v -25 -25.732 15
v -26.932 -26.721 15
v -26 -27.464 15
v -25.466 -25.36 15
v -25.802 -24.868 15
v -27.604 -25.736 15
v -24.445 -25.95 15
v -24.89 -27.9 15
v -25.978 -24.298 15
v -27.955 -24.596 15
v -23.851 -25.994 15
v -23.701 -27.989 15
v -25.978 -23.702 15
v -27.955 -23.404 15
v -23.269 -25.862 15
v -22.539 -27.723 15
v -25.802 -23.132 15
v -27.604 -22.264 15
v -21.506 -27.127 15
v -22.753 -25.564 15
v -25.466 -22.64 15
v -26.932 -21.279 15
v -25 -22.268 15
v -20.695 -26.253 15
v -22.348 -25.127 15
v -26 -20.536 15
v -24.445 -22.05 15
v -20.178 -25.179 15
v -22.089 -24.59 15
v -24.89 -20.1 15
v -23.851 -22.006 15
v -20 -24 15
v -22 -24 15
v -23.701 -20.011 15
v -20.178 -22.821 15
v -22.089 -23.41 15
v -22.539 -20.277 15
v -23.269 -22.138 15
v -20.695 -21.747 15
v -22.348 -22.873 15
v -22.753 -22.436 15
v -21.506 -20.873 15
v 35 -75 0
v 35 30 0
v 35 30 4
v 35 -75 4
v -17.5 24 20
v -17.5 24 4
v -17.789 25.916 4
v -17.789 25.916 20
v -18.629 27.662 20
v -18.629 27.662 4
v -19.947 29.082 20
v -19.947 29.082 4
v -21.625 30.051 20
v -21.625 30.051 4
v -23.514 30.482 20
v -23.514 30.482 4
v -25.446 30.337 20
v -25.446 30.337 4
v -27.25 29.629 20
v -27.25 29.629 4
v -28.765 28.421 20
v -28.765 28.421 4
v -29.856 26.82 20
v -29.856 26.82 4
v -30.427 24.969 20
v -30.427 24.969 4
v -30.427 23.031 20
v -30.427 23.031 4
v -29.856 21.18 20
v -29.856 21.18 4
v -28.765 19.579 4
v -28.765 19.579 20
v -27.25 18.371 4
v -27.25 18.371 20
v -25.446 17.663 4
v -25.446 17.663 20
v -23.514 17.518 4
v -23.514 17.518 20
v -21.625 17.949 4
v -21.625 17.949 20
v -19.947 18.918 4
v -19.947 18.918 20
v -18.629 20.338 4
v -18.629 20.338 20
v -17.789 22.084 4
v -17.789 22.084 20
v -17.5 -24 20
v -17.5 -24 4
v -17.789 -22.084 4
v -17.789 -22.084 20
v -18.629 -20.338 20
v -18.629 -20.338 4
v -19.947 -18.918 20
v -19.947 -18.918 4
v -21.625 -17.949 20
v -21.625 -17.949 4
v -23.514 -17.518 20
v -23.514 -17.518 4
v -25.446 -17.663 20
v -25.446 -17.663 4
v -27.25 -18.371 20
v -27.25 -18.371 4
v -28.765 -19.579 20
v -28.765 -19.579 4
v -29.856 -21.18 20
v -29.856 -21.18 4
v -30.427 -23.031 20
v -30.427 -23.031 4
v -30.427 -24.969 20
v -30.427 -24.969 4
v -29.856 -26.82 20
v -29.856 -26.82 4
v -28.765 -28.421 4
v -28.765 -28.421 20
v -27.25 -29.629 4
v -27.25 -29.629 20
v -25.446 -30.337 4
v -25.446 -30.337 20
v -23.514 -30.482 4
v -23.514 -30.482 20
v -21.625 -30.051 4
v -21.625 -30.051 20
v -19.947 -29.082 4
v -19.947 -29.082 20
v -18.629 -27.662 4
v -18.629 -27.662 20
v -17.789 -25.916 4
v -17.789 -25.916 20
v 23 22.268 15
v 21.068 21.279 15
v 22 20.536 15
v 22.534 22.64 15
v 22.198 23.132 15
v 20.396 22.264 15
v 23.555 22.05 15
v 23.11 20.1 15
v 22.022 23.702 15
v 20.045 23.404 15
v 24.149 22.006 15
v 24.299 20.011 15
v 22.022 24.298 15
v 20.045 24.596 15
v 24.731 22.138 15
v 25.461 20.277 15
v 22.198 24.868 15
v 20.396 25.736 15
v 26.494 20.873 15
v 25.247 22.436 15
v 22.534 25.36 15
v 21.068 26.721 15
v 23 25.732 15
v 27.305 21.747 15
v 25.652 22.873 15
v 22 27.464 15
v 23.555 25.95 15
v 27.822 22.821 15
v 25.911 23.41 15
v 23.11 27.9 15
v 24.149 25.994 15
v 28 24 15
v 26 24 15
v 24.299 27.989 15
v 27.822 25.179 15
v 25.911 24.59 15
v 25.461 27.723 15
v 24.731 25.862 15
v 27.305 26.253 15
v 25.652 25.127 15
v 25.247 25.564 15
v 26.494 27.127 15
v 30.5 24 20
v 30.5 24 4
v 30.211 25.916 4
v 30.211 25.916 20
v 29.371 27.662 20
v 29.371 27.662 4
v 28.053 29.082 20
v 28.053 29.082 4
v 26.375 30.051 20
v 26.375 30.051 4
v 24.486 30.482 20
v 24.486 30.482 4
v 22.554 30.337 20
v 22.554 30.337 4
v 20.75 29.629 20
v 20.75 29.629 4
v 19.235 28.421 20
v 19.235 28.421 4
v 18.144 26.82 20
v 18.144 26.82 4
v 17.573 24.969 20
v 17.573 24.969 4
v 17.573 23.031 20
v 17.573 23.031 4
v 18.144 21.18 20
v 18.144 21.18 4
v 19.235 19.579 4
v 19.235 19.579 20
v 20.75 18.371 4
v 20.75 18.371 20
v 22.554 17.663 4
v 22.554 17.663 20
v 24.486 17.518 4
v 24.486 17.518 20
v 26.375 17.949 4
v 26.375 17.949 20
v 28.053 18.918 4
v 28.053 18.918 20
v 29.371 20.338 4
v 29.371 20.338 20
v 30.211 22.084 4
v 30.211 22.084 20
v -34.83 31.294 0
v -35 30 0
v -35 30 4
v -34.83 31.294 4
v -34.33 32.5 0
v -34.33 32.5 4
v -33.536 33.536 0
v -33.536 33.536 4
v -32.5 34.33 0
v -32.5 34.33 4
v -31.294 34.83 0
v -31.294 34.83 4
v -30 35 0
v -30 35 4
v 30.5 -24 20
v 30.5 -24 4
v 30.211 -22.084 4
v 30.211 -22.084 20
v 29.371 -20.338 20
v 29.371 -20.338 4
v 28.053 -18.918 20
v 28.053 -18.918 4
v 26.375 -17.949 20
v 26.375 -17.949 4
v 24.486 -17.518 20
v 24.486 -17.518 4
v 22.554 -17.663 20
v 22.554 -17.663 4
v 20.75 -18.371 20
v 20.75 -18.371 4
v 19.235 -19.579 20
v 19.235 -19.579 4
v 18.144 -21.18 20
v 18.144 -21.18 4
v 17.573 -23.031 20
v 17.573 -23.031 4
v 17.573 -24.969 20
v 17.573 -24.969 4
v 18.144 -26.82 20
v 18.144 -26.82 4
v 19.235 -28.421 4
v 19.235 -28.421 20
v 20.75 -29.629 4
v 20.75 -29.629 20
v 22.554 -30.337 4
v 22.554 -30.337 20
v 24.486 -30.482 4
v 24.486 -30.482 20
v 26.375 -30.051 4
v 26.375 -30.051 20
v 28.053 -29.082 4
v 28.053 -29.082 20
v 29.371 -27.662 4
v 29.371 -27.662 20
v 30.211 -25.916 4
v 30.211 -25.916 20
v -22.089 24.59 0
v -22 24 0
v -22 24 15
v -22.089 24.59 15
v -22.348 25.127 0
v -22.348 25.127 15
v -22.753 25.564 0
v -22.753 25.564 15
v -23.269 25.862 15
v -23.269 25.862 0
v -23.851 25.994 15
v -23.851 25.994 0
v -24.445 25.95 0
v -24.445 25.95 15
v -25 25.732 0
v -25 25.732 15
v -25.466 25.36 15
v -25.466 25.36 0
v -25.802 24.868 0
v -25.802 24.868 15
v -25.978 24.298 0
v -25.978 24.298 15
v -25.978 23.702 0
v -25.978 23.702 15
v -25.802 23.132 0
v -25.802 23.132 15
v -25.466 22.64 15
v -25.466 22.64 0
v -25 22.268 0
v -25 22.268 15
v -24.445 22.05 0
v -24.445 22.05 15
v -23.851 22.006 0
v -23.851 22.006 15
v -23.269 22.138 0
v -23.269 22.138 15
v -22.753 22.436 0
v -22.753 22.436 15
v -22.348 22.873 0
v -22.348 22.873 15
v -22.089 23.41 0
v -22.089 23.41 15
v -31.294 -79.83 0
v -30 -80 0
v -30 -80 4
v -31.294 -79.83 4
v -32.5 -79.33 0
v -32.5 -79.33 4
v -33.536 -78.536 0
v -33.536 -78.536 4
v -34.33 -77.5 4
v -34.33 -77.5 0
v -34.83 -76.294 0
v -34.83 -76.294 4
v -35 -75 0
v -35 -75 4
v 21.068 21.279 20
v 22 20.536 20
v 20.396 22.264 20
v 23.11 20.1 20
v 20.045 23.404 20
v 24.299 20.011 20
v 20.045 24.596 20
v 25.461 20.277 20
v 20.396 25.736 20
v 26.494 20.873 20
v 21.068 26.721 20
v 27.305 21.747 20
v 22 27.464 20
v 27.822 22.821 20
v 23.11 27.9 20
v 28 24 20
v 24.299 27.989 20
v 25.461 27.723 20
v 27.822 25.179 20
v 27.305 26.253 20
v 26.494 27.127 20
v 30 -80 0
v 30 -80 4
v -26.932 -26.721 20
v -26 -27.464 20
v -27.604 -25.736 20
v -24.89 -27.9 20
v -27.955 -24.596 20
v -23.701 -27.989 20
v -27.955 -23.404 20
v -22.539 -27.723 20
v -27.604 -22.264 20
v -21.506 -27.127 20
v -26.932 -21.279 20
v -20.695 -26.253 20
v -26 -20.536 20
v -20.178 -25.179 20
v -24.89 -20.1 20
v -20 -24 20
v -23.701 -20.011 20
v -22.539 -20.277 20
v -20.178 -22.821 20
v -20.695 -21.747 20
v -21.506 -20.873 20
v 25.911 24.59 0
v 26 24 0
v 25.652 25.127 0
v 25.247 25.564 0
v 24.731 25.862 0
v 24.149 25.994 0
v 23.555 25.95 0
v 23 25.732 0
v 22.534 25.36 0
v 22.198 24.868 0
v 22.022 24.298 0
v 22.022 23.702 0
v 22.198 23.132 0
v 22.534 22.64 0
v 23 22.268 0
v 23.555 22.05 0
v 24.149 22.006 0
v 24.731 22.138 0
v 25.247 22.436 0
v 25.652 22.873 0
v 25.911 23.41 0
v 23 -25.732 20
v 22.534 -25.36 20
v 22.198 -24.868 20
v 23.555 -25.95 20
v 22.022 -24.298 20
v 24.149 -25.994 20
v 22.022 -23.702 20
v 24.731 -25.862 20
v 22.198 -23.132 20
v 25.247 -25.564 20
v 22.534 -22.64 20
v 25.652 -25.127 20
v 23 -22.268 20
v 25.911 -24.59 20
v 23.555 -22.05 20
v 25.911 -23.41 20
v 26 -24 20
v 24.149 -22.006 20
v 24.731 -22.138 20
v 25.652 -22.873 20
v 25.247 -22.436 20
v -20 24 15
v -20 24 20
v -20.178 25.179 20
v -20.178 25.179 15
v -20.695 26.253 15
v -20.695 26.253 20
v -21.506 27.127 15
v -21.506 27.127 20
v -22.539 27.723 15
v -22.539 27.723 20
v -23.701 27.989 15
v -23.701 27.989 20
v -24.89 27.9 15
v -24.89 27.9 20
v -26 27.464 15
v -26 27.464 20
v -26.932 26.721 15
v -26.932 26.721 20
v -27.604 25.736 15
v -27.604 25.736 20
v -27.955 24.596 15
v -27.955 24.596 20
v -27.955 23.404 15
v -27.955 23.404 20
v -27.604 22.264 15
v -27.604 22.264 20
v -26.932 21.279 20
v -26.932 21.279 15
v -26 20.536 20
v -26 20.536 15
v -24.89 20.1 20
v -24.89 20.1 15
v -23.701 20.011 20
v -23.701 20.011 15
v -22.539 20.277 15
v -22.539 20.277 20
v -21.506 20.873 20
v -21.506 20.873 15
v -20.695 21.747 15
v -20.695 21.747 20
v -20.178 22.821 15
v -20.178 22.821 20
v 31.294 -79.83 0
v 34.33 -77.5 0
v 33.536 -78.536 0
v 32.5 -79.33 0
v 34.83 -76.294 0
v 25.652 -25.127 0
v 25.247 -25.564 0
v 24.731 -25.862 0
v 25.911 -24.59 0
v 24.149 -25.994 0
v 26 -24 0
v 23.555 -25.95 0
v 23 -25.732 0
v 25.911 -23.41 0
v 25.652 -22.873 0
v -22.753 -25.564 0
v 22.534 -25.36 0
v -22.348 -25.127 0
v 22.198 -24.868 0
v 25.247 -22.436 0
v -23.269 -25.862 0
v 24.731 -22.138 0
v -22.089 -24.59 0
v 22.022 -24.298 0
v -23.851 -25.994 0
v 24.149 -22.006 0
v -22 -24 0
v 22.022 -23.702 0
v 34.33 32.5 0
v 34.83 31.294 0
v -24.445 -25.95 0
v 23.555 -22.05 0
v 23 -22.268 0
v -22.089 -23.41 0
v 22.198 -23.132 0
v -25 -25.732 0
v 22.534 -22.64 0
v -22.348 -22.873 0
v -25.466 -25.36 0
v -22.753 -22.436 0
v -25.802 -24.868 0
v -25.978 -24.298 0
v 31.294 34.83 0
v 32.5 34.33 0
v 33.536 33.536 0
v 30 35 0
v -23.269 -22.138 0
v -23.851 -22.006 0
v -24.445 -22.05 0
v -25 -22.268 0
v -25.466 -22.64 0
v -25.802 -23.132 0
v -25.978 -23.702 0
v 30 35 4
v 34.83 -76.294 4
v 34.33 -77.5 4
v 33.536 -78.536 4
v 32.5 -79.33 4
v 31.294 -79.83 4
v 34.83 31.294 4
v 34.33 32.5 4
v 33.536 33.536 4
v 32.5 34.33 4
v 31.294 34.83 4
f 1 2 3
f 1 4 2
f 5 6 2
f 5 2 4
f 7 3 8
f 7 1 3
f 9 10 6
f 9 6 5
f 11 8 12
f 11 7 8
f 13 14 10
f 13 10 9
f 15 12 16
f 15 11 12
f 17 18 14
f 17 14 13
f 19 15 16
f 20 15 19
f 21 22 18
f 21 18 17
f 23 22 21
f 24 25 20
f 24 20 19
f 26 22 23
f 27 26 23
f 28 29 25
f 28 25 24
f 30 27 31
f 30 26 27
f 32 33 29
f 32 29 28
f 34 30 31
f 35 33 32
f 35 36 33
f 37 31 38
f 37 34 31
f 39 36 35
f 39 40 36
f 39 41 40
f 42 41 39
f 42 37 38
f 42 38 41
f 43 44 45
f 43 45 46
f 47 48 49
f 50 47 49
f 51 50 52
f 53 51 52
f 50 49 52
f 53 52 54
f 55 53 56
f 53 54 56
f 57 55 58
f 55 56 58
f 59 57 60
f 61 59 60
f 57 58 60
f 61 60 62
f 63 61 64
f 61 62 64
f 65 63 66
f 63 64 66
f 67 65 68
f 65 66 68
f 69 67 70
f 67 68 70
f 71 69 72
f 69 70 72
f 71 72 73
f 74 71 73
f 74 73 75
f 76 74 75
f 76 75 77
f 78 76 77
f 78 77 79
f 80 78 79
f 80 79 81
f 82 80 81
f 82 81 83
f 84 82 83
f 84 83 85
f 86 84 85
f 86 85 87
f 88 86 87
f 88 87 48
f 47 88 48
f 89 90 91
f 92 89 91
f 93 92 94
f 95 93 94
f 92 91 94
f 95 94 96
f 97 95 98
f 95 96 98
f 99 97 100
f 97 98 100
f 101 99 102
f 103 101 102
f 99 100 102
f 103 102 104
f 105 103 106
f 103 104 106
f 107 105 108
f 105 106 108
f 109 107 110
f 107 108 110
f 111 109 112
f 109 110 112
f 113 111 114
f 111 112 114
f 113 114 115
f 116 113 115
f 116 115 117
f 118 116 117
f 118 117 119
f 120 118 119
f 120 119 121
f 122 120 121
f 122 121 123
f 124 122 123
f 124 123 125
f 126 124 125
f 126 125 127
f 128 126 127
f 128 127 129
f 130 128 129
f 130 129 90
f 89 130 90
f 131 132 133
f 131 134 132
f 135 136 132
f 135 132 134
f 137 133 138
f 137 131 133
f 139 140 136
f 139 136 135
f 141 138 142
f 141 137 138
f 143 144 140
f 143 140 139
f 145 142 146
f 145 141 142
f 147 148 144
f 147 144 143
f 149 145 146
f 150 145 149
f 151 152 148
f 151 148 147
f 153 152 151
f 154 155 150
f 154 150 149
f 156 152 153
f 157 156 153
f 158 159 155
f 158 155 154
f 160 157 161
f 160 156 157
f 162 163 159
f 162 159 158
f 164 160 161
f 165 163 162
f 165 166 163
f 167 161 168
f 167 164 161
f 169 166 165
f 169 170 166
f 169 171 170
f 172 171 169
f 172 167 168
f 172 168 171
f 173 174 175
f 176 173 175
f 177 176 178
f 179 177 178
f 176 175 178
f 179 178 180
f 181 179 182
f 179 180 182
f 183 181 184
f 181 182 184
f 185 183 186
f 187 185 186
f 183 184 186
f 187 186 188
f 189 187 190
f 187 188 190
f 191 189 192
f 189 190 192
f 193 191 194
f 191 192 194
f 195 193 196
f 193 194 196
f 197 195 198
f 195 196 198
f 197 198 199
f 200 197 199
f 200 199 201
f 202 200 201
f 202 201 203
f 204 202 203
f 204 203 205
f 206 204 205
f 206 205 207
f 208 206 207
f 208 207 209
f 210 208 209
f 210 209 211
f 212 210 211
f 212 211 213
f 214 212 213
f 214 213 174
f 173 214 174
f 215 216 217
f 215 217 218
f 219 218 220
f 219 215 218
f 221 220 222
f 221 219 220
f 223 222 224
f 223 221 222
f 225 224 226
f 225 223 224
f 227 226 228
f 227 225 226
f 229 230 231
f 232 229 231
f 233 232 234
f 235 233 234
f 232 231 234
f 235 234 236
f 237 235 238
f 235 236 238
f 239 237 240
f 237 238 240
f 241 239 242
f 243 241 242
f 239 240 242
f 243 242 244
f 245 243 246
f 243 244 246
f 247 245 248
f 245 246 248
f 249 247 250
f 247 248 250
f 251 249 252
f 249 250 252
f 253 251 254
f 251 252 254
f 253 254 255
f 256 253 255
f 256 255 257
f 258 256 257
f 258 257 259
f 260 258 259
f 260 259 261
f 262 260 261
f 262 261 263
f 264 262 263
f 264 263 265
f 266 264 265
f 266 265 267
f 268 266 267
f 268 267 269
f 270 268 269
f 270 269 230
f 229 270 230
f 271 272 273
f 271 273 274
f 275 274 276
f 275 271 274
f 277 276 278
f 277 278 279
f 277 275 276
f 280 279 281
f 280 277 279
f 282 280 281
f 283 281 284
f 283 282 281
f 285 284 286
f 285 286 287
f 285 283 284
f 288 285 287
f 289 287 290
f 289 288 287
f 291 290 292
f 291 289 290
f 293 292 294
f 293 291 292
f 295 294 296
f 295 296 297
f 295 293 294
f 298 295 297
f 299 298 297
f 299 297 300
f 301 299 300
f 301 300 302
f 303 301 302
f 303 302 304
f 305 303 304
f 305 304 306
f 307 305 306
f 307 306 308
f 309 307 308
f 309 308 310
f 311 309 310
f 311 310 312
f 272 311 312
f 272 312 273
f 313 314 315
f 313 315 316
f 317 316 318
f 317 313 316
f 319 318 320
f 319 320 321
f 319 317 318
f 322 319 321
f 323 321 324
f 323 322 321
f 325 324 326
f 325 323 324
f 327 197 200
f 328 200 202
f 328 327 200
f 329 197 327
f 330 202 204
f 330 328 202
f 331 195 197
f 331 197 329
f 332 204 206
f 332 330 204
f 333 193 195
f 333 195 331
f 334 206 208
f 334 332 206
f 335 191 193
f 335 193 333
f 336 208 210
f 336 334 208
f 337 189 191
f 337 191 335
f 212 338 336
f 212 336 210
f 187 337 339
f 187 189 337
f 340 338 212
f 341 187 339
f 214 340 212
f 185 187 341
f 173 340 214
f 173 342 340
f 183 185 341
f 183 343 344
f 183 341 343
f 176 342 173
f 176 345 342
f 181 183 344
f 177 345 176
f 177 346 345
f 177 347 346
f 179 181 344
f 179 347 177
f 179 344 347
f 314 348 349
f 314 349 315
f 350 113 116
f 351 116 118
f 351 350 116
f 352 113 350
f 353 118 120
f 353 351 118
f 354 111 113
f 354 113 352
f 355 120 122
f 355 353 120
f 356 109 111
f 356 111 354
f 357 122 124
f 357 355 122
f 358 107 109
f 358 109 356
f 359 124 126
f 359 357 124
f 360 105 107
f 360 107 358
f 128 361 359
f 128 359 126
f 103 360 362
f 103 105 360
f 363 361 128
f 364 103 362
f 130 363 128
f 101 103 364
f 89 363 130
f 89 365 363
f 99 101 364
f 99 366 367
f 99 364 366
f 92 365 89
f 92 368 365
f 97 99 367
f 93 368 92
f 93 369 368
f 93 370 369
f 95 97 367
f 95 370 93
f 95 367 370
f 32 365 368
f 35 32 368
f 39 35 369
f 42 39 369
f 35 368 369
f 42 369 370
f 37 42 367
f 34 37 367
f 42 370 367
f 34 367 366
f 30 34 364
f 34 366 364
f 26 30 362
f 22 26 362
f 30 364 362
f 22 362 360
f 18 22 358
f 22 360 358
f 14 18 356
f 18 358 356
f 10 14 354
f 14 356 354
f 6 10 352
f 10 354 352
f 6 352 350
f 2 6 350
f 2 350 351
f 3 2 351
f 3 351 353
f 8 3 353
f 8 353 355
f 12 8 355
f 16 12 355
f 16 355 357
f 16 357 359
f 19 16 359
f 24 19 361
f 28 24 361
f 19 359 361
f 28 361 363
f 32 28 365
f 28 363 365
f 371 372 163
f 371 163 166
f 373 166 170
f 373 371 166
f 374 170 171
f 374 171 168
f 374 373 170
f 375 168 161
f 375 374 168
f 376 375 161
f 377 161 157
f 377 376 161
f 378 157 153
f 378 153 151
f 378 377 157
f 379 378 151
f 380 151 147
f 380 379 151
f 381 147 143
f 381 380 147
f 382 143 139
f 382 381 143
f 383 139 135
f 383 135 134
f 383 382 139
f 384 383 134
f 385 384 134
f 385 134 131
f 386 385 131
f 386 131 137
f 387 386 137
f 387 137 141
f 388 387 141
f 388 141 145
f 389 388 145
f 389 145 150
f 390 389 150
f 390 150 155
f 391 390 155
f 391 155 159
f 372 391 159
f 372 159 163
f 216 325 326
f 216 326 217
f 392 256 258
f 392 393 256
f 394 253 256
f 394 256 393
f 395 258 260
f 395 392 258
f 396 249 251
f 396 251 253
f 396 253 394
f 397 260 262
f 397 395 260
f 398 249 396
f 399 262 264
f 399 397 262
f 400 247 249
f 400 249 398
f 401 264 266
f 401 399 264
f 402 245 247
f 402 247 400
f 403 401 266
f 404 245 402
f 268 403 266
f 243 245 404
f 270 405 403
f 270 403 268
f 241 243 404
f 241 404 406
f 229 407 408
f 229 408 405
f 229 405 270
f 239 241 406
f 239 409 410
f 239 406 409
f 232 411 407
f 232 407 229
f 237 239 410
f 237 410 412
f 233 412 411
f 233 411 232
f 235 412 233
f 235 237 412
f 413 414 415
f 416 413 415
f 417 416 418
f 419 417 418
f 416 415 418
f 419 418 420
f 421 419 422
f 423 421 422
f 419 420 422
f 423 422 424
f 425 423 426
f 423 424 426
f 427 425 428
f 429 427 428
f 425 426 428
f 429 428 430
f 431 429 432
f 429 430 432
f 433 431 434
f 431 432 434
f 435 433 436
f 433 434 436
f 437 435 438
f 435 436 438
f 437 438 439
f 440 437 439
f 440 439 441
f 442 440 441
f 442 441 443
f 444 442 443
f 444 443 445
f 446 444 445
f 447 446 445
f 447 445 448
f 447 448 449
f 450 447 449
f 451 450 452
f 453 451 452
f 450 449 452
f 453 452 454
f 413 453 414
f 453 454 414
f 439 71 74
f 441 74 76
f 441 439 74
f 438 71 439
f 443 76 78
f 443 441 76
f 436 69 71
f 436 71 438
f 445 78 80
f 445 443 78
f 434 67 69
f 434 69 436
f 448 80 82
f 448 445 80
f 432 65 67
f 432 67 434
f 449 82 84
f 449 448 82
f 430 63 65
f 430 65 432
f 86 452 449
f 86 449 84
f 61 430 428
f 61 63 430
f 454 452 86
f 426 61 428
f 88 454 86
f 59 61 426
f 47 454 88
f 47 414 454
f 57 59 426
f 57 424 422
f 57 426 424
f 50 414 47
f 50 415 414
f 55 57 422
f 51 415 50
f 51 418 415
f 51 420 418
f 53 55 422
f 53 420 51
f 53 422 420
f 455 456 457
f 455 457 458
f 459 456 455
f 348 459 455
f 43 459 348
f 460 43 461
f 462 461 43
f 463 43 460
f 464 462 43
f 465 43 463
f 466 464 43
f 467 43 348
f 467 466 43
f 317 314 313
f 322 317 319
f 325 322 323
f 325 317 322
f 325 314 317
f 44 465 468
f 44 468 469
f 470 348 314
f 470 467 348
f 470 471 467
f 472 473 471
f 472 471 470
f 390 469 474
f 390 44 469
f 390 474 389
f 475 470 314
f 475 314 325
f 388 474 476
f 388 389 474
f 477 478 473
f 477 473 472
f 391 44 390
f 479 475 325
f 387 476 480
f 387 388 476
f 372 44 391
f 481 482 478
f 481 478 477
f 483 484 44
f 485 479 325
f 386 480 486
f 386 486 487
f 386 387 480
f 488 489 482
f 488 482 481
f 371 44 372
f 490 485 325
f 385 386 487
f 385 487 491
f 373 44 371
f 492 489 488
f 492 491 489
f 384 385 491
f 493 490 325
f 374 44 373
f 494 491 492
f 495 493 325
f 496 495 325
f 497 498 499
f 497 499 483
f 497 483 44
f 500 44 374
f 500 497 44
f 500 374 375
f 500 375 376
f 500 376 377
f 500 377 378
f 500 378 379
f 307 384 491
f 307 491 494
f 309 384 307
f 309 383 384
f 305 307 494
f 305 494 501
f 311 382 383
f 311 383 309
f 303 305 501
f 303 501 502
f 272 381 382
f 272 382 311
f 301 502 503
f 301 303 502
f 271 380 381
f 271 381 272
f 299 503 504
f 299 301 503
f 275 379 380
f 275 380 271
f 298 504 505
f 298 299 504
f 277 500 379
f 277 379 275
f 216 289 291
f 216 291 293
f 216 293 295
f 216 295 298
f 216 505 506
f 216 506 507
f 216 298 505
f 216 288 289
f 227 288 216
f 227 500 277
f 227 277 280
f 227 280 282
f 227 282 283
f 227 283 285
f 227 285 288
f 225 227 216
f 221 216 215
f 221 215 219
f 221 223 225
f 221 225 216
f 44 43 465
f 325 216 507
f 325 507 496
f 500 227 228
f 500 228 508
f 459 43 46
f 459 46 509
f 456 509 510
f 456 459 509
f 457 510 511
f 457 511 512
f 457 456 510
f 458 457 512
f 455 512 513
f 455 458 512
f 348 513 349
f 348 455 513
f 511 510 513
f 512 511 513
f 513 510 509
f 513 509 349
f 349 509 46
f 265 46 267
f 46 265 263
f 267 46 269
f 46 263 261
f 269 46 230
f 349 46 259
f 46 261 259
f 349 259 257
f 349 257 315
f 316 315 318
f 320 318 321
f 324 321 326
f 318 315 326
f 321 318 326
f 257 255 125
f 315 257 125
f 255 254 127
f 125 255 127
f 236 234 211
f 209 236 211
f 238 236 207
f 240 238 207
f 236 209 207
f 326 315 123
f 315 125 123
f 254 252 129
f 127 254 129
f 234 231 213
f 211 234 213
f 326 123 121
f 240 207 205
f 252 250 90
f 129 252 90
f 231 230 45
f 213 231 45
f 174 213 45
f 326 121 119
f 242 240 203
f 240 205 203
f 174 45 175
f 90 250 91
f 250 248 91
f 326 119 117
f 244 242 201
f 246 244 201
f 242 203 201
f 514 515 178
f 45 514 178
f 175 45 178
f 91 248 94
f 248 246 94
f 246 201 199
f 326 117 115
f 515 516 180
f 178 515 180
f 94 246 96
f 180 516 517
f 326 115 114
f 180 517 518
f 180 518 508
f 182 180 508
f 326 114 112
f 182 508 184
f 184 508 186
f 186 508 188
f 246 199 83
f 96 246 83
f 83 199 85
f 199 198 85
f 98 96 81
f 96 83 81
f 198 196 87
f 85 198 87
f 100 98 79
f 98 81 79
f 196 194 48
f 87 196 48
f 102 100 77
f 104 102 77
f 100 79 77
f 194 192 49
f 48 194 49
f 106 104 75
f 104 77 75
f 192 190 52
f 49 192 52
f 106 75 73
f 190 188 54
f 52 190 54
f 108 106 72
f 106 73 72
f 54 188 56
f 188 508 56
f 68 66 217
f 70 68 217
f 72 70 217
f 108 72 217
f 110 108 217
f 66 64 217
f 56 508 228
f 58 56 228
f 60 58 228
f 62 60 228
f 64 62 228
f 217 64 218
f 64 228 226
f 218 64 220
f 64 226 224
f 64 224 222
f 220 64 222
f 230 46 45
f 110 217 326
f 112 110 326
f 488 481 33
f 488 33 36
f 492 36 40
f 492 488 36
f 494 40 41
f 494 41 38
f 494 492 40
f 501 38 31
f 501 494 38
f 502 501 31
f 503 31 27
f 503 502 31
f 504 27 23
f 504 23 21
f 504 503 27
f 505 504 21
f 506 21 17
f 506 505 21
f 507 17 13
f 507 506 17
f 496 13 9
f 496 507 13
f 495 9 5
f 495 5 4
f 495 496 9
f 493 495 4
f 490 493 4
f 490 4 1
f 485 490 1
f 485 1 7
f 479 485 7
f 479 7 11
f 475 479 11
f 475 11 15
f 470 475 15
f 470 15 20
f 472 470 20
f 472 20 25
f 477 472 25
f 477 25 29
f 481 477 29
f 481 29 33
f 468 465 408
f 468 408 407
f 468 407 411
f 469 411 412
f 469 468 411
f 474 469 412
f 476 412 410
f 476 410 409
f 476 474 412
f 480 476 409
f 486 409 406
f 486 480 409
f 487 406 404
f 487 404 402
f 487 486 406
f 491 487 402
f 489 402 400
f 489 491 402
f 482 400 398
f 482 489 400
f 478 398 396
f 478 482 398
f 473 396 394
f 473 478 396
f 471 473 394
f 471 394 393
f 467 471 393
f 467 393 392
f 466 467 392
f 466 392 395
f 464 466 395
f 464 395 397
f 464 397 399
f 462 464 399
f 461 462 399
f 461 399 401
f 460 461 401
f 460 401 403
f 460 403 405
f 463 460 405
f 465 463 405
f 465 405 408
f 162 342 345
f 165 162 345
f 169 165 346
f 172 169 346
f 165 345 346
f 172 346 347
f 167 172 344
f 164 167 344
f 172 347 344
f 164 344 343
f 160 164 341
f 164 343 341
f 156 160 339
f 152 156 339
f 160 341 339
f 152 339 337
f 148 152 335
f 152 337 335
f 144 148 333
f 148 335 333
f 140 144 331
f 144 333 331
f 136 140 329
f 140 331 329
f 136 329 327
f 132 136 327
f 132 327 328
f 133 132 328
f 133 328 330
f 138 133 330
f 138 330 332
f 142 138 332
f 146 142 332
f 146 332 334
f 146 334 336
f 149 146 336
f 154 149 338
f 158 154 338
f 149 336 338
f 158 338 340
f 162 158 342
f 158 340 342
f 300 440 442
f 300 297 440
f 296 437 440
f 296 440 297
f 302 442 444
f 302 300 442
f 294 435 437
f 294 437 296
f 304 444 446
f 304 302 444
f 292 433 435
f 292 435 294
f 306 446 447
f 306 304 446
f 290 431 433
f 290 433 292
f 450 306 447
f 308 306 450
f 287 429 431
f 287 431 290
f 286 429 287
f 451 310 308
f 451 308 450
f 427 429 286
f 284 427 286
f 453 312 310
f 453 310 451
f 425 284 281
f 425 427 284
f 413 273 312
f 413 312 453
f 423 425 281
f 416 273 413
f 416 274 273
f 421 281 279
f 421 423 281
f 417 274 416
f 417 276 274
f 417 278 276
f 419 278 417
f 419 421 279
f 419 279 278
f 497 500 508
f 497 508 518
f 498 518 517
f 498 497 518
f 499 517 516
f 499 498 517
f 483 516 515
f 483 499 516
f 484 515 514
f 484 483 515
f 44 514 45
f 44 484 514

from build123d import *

# Parameters (mm, degrees)
SKETCH1_R           = 6.5
BOSS_EXTRUDE1_DEPTH = 4
SKETCH1_5_R         = 6.5
SKETCH1_5_R_2       = 4
SKETCH1_5_R_3       = 2
BOSS_EXTRUDE2_DEPTH = 20
CUT_EXTRUDE1_START  = 20
SKETCH1_6_R         = 4
SKETCH1_6_R_2       = 2
CUT_EXTRUDE1_DEPTH  = 5


with BuildPart() as part:
    # Sketch1 → Boss-Extrude1 (new body)
    with BuildSketch(Plane.XY):
        with BuildLine():
            Line((-30, 35), (30, 35))
            ThreePointArc((30, 35), (33.535533906, 33.535533906), (35, 30))
            Line((35, 30), (35, -75))
            ThreePointArc((35, -75), (33.535533906, -78.535533906), (30, -80))
            Line((30, -80), (-30, -80))
            ThreePointArc((-30, -80), (-33.535533906, -78.535533906), (-35, -75))
            Line((-35, -75), (-35, 30))
            ThreePointArc((-35, 30), (-33.535533906, 33.535533906), (-30, 35))
        make_face()
        with Locations((24, -24)):
            Circle(SKETCH1_R, mode=Mode.SUBTRACT)
        with Locations((24, 24)):
            Circle(SKETCH1_R, mode=Mode.SUBTRACT)
        with Locations((-24, 24)):
            Circle(SKETCH1_R, mode=Mode.SUBTRACT)
        with Locations((-24, -24)):
            Circle(SKETCH1_R, mode=Mode.SUBTRACT)
    extrude(amount=BOSS_EXTRUDE1_DEPTH)

    # Sketch1_5 → Boss-Extrude2 (add)
    with BuildSketch(Plane.XY):
        with Locations((-24, -24)):
            Circle(SKETCH1_5_R)
        with Locations((-24, -24)):
            Circle(SKETCH1_5_R_2, mode=Mode.SUBTRACT)
        with Locations((-24, -24)):
            Circle(SKETCH1_5_R_2)
        with Locations((-24, -24)):
            Circle(SKETCH1_5_R_3, mode=Mode.SUBTRACT)
        with Locations((24, -24)):
            Circle(SKETCH1_5_R)
        with Locations((24, -24)):
            Circle(SKETCH1_5_R_2, mode=Mode.SUBTRACT)
        with Locations((24, -24)):
            Circle(SKETCH1_5_R_2)
        with Locations((24, -24)):
            Circle(SKETCH1_5_R_3, mode=Mode.SUBTRACT)
        with Locations((24, 24)):
            Circle(SKETCH1_5_R)
        with Locations((24, 24)):
            Circle(SKETCH1_5_R_2, mode=Mode.SUBTRACT)
        with Locations((24, 24)):
            Circle(SKETCH1_5_R_2)
        with Locations((24, 24)):
            Circle(SKETCH1_5_R_3, mode=Mode.SUBTRACT)
        with Locations((-24, 24)):
            Circle(SKETCH1_5_R)
        with Locations((-24, 24)):
            Circle(SKETCH1_5_R_2, mode=Mode.SUBTRACT)
        with Locations((-24, 24)):
            Circle(SKETCH1_5_R_2)
        with Locations((-24, 24)):
            Circle(SKETCH1_5_R_3, mode=Mode.SUBTRACT)
    extrude(amount=BOSS_EXTRUDE2_DEPTH)

    # Sketch1_6 → Cut-Extrude1 (cut)
    with BuildSketch(Plane.XY.offset(CUT_EXTRUDE1_START)):
        with Locations((24, 24)):
            Circle(SKETCH1_6_R)
        with Locations((24, 24)):
            Circle(SKETCH1_6_R_2, mode=Mode.SUBTRACT)
        with Locations((-24, 24)):
            Circle(SKETCH1_6_R)
        with Locations((-24, 24)):
            Circle(SKETCH1_6_R_2, mode=Mode.SUBTRACT)
        with Locations((-24, -24)):
            Circle(SKETCH1_6_R)
        with Locations((-24, -24)):
            Circle(SKETCH1_6_R_2, mode=Mode.SUBTRACT)
        with Locations((24, -24)):
            Circle(SKETCH1_6_R_2)
    extrude(amount=-CUT_EXTRUDE1_DEPTH, mode=Mode.SUBTRACT)


solid = part.part
